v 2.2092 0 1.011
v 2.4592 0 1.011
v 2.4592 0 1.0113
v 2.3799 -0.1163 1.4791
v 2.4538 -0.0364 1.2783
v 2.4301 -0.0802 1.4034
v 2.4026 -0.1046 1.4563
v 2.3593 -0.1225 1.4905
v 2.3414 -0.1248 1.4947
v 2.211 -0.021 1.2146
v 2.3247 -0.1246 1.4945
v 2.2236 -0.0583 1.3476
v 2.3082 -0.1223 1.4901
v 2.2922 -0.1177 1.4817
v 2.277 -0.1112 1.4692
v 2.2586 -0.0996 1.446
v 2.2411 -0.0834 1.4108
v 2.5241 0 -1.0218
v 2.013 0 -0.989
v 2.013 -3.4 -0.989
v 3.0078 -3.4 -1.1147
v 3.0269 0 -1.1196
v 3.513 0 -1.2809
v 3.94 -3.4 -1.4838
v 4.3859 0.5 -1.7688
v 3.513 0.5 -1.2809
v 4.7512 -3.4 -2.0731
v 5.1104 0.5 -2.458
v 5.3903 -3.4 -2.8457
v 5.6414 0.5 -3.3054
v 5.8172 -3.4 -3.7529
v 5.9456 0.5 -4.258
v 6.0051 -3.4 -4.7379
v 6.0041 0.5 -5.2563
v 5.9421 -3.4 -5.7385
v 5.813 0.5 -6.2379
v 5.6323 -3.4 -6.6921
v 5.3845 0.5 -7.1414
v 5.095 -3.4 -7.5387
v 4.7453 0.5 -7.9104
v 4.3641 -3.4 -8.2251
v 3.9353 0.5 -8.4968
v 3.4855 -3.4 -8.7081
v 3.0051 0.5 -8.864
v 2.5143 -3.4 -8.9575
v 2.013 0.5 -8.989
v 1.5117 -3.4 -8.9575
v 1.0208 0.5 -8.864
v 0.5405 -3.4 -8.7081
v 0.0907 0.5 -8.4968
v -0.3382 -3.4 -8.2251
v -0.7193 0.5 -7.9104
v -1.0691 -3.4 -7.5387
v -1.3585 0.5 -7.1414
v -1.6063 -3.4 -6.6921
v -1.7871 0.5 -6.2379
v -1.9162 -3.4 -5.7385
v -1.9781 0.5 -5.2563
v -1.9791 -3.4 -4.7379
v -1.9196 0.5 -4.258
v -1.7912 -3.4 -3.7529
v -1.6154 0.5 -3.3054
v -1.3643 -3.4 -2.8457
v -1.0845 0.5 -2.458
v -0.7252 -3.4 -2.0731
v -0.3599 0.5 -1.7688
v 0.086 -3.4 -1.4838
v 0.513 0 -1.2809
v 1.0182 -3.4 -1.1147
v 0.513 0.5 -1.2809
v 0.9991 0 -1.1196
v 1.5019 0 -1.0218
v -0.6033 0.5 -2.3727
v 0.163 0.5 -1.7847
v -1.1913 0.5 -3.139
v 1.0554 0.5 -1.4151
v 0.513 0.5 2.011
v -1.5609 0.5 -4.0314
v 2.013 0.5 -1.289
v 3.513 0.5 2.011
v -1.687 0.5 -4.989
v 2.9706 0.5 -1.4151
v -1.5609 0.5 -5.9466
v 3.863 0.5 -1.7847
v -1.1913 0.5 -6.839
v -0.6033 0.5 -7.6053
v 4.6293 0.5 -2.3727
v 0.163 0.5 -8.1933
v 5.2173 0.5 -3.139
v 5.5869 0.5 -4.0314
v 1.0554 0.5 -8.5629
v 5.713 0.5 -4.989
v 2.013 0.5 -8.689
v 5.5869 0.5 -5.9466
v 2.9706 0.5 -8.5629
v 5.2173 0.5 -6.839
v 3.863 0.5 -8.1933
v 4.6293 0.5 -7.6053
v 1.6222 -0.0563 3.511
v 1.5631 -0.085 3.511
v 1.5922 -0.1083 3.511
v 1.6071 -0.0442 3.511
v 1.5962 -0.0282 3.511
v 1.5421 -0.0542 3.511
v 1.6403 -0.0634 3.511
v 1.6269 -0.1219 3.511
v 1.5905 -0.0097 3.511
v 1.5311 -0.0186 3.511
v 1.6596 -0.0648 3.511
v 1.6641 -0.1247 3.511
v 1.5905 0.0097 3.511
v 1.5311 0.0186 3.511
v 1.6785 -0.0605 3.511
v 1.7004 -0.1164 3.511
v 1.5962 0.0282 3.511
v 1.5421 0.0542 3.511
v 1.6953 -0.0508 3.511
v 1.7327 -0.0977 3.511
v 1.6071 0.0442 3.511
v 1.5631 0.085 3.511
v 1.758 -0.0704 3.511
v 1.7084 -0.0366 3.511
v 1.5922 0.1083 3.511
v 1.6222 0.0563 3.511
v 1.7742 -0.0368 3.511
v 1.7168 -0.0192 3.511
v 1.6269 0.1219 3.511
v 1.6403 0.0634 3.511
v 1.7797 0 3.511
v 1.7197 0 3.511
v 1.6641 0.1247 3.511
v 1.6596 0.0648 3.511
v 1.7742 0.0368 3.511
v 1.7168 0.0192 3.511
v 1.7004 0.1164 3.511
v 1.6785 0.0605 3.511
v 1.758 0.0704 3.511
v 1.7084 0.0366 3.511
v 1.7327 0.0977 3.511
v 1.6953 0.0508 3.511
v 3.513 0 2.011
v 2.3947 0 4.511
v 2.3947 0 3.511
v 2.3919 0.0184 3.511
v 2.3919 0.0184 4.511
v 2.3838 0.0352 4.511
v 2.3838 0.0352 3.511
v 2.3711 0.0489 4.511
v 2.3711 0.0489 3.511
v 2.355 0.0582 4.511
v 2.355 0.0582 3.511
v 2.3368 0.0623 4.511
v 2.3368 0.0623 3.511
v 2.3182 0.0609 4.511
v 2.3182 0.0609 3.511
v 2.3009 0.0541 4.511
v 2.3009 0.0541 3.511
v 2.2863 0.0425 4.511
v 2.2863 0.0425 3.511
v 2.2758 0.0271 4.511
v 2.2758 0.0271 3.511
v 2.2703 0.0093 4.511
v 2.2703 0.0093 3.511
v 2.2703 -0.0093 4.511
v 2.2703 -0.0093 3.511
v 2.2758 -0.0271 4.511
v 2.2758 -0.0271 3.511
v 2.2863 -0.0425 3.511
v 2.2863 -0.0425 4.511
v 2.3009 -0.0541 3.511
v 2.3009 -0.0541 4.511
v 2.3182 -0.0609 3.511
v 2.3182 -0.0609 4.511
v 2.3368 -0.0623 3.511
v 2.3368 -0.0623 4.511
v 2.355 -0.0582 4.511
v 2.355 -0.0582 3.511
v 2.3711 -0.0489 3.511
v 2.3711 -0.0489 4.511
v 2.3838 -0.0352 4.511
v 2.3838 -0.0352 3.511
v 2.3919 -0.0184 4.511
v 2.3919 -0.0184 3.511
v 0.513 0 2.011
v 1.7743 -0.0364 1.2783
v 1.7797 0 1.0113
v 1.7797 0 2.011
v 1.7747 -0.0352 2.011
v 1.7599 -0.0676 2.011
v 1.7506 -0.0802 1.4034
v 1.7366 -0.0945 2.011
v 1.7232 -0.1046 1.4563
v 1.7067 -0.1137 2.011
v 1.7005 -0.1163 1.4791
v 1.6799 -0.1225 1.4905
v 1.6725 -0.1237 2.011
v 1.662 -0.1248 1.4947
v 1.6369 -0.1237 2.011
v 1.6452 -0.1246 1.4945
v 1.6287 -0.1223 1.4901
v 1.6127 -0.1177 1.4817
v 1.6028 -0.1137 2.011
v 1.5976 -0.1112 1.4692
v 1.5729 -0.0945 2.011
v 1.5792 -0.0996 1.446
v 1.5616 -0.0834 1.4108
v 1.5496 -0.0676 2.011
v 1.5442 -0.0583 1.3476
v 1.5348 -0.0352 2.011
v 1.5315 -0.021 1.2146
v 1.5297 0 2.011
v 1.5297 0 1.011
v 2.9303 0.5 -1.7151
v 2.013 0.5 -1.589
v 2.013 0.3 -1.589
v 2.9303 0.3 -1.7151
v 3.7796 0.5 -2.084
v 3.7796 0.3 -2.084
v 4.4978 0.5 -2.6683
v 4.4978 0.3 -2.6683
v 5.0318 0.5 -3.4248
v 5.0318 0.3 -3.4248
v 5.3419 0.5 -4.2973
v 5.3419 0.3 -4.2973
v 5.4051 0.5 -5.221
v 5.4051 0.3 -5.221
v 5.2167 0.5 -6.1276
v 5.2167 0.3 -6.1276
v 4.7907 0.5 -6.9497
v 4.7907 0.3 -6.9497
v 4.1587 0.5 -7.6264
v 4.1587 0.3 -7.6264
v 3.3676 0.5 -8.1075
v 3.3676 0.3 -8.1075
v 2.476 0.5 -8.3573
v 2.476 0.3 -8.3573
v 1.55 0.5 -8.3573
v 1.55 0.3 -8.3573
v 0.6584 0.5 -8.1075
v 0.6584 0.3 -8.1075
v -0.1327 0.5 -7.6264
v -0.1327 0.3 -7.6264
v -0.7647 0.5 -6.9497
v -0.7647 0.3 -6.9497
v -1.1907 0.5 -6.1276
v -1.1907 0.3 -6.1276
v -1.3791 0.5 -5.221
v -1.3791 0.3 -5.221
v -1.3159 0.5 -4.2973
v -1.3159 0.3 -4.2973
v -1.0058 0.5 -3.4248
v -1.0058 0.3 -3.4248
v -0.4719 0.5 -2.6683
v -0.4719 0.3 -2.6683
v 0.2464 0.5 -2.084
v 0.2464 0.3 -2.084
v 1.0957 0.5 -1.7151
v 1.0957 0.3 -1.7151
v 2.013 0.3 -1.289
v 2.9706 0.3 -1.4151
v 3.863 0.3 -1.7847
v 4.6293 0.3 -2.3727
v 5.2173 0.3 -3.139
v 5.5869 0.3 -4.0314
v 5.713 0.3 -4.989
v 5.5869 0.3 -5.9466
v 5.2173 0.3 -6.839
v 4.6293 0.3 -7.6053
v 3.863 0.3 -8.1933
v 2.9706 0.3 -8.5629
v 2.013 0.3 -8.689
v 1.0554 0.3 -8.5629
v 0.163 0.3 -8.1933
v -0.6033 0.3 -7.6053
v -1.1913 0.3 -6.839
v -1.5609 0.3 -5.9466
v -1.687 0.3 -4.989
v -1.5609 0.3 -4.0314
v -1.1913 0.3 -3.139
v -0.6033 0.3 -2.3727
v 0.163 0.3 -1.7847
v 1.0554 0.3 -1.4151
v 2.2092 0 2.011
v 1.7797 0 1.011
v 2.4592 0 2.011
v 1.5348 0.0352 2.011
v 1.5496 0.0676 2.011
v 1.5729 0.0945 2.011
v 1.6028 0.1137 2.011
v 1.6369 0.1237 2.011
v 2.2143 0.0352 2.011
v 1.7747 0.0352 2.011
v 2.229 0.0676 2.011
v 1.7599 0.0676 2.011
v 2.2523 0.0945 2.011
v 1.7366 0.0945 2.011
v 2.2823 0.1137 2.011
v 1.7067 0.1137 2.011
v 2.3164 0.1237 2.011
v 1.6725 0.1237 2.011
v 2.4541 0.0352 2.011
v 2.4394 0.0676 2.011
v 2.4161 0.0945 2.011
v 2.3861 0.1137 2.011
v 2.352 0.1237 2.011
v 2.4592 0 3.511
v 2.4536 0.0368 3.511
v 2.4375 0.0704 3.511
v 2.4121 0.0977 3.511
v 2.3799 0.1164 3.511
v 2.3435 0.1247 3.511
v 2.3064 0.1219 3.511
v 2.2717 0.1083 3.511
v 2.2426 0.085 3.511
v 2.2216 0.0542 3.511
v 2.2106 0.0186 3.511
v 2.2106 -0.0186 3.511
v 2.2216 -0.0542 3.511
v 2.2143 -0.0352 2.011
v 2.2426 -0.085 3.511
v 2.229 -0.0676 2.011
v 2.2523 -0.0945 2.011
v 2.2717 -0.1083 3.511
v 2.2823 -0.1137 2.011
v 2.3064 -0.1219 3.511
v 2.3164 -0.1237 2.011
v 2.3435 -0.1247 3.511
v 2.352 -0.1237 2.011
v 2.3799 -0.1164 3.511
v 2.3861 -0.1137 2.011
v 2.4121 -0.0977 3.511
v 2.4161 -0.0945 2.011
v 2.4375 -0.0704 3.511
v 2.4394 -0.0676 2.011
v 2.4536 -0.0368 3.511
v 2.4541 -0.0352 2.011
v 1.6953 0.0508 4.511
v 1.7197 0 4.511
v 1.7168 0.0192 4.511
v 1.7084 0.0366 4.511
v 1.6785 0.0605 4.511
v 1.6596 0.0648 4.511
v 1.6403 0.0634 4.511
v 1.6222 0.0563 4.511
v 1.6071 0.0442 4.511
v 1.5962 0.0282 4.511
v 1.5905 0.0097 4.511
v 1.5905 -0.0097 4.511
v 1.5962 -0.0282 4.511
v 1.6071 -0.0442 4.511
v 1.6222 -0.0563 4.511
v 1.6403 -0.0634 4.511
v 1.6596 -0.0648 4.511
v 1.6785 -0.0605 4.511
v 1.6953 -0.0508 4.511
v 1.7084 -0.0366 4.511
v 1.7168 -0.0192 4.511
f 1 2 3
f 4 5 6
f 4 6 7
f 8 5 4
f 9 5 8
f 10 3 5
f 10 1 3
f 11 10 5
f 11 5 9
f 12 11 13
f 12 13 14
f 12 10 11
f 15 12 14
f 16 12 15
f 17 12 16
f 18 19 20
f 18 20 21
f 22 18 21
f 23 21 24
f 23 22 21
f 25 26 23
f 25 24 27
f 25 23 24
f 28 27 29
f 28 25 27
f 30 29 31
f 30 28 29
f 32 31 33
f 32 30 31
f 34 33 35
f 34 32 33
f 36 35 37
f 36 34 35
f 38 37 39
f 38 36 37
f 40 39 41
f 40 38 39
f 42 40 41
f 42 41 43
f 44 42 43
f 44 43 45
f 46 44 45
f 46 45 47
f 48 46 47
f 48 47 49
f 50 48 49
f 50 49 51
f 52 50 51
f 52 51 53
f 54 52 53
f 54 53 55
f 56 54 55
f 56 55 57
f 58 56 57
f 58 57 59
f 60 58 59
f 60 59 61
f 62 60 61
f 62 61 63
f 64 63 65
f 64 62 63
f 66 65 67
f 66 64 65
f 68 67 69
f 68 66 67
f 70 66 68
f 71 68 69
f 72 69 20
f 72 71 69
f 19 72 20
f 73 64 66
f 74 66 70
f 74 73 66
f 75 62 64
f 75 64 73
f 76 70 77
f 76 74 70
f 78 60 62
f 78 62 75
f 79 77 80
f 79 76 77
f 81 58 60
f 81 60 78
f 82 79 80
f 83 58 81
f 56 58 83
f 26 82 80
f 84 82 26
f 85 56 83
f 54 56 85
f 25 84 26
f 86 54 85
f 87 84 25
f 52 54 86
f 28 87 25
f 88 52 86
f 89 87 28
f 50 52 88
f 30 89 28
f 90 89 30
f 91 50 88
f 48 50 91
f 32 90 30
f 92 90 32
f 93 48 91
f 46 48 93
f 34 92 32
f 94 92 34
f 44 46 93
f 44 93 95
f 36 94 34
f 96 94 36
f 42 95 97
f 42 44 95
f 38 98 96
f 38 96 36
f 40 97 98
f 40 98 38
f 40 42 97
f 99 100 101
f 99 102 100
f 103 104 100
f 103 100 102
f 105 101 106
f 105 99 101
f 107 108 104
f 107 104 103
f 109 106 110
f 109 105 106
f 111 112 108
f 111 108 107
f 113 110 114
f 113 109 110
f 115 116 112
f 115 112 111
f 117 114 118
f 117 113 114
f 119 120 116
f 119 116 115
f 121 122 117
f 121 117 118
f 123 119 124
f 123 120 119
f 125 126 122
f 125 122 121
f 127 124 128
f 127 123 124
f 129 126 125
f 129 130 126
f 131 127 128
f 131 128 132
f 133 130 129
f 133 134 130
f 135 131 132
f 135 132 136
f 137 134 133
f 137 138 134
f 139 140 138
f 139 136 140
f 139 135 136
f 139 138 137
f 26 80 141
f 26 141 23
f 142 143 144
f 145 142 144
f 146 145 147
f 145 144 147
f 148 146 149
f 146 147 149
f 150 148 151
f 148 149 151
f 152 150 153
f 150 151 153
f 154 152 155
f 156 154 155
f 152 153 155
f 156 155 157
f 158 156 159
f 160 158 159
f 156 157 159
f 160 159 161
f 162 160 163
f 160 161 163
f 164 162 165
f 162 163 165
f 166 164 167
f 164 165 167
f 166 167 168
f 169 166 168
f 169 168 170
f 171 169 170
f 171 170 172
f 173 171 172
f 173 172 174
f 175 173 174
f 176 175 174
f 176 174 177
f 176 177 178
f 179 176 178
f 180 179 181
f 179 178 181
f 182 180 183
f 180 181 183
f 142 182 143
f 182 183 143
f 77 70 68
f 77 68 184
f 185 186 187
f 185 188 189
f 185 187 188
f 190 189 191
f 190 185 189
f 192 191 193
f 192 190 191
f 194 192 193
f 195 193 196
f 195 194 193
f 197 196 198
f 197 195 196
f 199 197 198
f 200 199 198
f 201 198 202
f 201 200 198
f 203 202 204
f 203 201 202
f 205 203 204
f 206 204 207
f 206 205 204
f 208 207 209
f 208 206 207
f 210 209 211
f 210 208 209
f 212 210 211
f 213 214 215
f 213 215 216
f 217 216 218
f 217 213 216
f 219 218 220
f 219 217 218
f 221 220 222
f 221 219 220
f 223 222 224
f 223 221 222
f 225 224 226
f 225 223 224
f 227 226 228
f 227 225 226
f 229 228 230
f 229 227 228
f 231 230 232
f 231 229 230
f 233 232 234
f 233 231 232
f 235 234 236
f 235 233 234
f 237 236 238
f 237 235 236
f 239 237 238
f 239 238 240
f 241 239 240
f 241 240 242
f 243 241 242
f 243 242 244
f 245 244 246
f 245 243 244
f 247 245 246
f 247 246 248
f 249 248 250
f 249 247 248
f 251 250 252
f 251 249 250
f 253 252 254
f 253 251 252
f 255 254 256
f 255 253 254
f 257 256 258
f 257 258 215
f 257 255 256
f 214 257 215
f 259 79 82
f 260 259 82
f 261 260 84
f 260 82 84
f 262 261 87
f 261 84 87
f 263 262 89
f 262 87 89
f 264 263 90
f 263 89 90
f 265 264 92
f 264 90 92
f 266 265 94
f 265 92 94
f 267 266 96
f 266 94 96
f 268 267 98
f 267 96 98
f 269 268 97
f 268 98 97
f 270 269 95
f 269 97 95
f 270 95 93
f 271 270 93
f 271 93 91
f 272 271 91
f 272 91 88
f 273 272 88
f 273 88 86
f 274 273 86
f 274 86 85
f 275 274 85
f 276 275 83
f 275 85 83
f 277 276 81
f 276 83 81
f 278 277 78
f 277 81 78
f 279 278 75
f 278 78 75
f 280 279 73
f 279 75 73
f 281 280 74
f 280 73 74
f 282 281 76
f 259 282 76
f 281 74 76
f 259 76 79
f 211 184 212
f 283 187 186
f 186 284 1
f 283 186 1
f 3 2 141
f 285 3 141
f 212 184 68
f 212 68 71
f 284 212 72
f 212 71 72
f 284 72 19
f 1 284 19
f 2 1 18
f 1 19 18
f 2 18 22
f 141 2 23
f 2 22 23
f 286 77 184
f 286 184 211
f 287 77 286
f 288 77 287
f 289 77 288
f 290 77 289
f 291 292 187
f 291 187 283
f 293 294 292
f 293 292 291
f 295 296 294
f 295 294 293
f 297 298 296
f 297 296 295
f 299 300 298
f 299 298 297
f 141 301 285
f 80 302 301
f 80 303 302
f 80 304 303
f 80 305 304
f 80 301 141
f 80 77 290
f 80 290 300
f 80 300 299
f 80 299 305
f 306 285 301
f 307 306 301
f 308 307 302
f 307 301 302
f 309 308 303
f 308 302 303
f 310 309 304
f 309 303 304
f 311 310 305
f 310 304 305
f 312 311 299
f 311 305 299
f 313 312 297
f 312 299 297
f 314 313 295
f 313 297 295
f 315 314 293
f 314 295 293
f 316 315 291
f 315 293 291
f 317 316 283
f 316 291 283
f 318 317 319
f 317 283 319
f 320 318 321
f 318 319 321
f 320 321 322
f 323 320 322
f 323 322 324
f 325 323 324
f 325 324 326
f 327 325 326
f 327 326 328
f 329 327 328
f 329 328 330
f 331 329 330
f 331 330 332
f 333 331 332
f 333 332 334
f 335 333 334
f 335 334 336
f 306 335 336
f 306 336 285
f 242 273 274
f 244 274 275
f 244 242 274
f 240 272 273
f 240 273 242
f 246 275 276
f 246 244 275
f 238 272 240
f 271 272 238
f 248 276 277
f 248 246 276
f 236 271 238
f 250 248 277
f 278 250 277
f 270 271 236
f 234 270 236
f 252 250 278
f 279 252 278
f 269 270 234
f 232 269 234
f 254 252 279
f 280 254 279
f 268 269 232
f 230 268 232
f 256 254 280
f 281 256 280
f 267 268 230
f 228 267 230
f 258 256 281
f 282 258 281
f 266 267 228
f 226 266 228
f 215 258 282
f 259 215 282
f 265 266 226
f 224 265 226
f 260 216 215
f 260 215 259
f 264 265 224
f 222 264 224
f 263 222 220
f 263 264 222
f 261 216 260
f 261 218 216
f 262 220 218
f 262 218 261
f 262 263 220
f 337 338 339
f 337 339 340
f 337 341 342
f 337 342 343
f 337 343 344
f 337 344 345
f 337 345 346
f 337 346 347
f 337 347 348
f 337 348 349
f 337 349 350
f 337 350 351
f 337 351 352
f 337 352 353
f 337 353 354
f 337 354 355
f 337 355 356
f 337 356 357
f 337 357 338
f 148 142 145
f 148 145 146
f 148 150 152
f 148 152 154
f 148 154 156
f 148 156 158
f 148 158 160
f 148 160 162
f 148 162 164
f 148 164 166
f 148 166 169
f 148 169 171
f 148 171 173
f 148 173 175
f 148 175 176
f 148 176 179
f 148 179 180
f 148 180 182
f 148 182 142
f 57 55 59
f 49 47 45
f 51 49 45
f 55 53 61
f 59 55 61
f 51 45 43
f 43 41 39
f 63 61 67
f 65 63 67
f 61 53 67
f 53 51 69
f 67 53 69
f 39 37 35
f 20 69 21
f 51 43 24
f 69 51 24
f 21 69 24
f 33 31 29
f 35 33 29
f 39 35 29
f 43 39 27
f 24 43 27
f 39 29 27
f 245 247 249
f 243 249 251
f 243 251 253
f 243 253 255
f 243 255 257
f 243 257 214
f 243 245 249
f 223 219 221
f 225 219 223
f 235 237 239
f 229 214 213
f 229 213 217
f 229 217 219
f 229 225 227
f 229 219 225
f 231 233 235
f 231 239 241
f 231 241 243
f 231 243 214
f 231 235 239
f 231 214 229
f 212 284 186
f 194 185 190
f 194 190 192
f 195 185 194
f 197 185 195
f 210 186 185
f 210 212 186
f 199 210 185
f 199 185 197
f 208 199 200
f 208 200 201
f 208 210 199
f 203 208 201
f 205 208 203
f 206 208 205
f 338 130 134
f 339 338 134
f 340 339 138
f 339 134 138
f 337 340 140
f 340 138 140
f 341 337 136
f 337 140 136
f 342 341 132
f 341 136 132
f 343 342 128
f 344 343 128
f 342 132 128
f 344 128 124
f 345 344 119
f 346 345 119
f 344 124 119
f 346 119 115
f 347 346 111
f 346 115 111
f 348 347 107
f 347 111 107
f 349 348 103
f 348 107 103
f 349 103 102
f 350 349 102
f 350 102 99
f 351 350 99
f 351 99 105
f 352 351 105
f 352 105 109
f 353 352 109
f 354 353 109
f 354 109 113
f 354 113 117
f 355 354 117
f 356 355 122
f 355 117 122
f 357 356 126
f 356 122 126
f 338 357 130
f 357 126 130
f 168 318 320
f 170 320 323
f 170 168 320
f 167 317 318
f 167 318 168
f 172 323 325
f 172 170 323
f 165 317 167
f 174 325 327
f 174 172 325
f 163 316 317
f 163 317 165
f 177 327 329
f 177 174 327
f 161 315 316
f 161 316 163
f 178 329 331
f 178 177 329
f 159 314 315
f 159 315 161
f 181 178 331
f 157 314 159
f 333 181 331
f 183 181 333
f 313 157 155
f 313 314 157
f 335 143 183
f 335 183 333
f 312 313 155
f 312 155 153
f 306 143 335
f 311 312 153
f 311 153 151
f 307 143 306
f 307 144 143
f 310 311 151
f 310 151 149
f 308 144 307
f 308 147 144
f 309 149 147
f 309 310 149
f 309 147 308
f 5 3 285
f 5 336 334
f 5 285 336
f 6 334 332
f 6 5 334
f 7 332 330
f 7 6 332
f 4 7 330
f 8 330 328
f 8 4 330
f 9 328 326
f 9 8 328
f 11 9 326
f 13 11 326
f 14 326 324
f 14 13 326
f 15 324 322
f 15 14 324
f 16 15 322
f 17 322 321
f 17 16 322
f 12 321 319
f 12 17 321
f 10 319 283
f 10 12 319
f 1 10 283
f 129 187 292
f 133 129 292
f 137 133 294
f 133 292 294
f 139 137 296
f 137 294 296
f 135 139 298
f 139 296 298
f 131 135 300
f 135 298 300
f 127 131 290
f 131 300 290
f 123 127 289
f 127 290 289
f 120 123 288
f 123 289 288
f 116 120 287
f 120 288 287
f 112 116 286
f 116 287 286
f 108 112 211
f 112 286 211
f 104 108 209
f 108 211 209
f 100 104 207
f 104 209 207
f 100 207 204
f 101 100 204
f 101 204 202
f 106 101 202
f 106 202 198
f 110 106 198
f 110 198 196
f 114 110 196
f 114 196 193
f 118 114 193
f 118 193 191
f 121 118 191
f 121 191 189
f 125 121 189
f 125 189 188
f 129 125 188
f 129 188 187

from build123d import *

# Parameters (mm, degrees)
SKETCH1_R               = 4
BOSS_EXTRUDE3_DEPTH     = 3.4
BOSS_EXTRUDE5_START     = 0.5
SKETCH3_R               = 4
BOSS_EXTRUDE5_DEPTH     = 0.5
BOSS_EXTRUDE6_DEPTH     = 0.5
SKETCH8_R               = 0.125
BOSS_EXTRUDE10_DEPTH    = 1.5
SKETCH9_R               = 0.0625
SKETCH9_R_2             = 0.065
BOSS_EXTRUDE11_DEPTH    = 1
CONG_1_R                = 1
ESQUISSE1_R             = 3.7
ESQUISSE1_R_2           = 3.4
ENL_V_MAT_EXTRU_1_DEPTH = 0.2


with BuildPart() as part:
    # Sketch1 → Boss-Extrude3 (new body)
    with BuildSketch(Plane(origin=(0, 0, 0), x_dir=(1, 0, 0), z_dir=(0, 1, 0))):
        with Locations(Location((2.012990556, 4.989015145, 0), (0, 0, 270))):
            Circle(SKETCH1_R)
    extrude(amount=-BOSS_EXTRUDE3_DEPTH)

    # Sketch3 → Boss-Extrude5 (add)
    with BuildSketch(Plane(origin=(0, 0, 0), x_dir=(1, 0, 0), z_dir=(0, 1, 0)).offset(BOSS_EXTRUDE5_START)):
        with Locations(Location((2.012990556, 4.989015145, 0), (0, 0, 270))):
            Circle(SKETCH3_R)
    extrude(amount=-BOSS_EXTRUDE5_DEPTH)

    # Sketch5 → Boss-Extrude6 (add)
    with BuildSketch(Plane(origin=(0, 0.5, 0), x_dir=(1, 0, 0), z_dir=(0, 1, 0))):
        with BuildLine():
            ThreePointArc((3.512990556, 1.280915901), (2.012990556, 0.989015145), (0.512990556, 1.280915901))
            Line((0.512990556, 1.280915901), (0.512990556, -2.010984855))
            Line((0.512990556, -2.010984855), (3.512990556, -2.010984855))
            Line((3.512990556, -2.010984855), (3.512990556, 1.280915901))
        make_face()
    extrude(amount=-BOSS_EXTRUDE6_DEPTH)

    # Sketch8 → Boss-Extrude10 (add)
    with BuildSketch(Plane.XY.offset(2.010984855)):
        with Locations((2.334197454, 0)):
            Circle(SKETCH8_R)
        with Locations((1.65473302, 0)):
            Circle(SKETCH8_R)
    extrude(amount=BOSS_EXTRUDE10_DEPTH)

    # Sketch9 → Boss-Extrude11 (add)
    with BuildSketch(Plane.XY.offset(3.510984855)):
        with Locations((2.332150334, 0)):
            Circle(SKETCH9_R)
        with Locations((1.65473302, 0)):
            Circle(SKETCH9_R_2)
    extrude(amount=BOSS_EXTRUDE11_DEPTH)

    # Congé1
    # the kernel refuses this fillet: 1 mm, written as the material it adds along each edge
    with BuildSketch(Plane(origin=(-0.290802546, 0, 2.010984855), x_dir=(0, 0, -1), z_dir=(1, 0, 0))) as cong_1_piece_1_section:
        with BuildLine():
            CenterArc((CONG_1_R, -CONG_1_R), CONG_1_R, 90, 90)
            Line((0, -CONG_1_R), (0, 0))
            Line((0, 0), (CONG_1_R, 0))
        make_face()
    cong_1_piece_1 = extrude(amount=5.25, mode=Mode.PRIVATE)
    cong_1_piece_1 = cong_1_piece_1 & Plane(origin=(2.334197454, 0, 1.652352457), x_dir=(1, 0, 0), z_dir=(0, 0, -1)) * Cylinder(0.125, 15, mode=Mode.PRIVATE)
    add(cong_1_piece_1)
    with BuildSketch(Plane(origin=(-0.290802546, 0, 2.010984855), x_dir=(0, 0, -1), z_dir=(1, 0, 0))) as cong_1_piece_2_section:
        with BuildLine():
            CenterArc((CONG_1_R, -CONG_1_R), CONG_1_R, 90, 90)
            Line((0, -CONG_1_R), (0, 0))
            Line((0, 0), (CONG_1_R, 0))
        make_face()
    cong_1_piece_2 = extrude(amount=5.25, mode=Mode.PRIVATE)
    cong_1_piece_2 = cong_1_piece_2 & Plane(origin=(1.65473302, 0, 1.652352457), x_dir=(1, 0, 0), z_dir=(0, 0, -1)) * Cylinder(0.125, 15, mode=Mode.PRIVATE)
    add(cong_1_piece_2)
    with BuildSketch(Plane(origin=(-0.97026698, 0, 2.010984855), x_dir=(0, 0, -1), z_dir=(1, 0, 0))) as cong_1_piece_3_section:
        with BuildLine():
            CenterArc((CONG_1_R, -CONG_1_R), CONG_1_R, 90, 90)
            Line((0, -CONG_1_R), (0, 0))
            Line((0, 0), (CONG_1_R, 0))
        make_face()
    cong_1_piece_3 = extrude(amount=5.25, mode=Mode.PRIVATE)
    cong_1_piece_3 = cong_1_piece_3 & Plane(origin=(2.334197454, 0, 1.652352457), x_dir=(1, 0, 0), z_dir=(0, 0, -1)) * Cylinder(0.125, 15, mode=Mode.PRIVATE)
    add(cong_1_piece_3)
    with BuildSketch(Plane(origin=(-0.97026698, 0, 2.010984855), x_dir=(0, 0, -1), z_dir=(1, 0, 0))) as cong_1_piece_4_section:
        with BuildLine():
            CenterArc((CONG_1_R, -CONG_1_R), CONG_1_R, 90, 90)
            Line((0, -CONG_1_R), (0, 0))
            Line((0, 0), (CONG_1_R, 0))
        make_face()
    cong_1_piece_4 = extrude(amount=5.25, mode=Mode.PRIVATE)
    cong_1_piece_4 = cong_1_piece_4 & Plane(origin=(1.65473302, 0, 1.652352457), x_dir=(1, 0, 0), z_dir=(0, 0, -1)) * Cylinder(0.125, 15, mode=Mode.PRIVATE)
    add(cong_1_piece_4)

    # Esquisse1 → Enlèv. mat.-Extru.1 (cut)
    with BuildSketch(Plane(origin=(0, 0.5, 0), x_dir=(1, 0, 0), z_dir=(0, 1, 0))):
        with Locations(Location((2.012990556, 4.989015145, 0), (0, 0, 270))):
            Circle(ESQUISSE1_R)
        with Locations(Location((2.012990556, 4.989015145, 0), (0, 0, 270))):
            Circle(ESQUISSE1_R_2, mode=Mode.SUBTRACT)
    extrude(amount=-ENL_V_MAT_EXTRU_1_DEPTH, mode=Mode.SUBTRACT)


solid = part.part
